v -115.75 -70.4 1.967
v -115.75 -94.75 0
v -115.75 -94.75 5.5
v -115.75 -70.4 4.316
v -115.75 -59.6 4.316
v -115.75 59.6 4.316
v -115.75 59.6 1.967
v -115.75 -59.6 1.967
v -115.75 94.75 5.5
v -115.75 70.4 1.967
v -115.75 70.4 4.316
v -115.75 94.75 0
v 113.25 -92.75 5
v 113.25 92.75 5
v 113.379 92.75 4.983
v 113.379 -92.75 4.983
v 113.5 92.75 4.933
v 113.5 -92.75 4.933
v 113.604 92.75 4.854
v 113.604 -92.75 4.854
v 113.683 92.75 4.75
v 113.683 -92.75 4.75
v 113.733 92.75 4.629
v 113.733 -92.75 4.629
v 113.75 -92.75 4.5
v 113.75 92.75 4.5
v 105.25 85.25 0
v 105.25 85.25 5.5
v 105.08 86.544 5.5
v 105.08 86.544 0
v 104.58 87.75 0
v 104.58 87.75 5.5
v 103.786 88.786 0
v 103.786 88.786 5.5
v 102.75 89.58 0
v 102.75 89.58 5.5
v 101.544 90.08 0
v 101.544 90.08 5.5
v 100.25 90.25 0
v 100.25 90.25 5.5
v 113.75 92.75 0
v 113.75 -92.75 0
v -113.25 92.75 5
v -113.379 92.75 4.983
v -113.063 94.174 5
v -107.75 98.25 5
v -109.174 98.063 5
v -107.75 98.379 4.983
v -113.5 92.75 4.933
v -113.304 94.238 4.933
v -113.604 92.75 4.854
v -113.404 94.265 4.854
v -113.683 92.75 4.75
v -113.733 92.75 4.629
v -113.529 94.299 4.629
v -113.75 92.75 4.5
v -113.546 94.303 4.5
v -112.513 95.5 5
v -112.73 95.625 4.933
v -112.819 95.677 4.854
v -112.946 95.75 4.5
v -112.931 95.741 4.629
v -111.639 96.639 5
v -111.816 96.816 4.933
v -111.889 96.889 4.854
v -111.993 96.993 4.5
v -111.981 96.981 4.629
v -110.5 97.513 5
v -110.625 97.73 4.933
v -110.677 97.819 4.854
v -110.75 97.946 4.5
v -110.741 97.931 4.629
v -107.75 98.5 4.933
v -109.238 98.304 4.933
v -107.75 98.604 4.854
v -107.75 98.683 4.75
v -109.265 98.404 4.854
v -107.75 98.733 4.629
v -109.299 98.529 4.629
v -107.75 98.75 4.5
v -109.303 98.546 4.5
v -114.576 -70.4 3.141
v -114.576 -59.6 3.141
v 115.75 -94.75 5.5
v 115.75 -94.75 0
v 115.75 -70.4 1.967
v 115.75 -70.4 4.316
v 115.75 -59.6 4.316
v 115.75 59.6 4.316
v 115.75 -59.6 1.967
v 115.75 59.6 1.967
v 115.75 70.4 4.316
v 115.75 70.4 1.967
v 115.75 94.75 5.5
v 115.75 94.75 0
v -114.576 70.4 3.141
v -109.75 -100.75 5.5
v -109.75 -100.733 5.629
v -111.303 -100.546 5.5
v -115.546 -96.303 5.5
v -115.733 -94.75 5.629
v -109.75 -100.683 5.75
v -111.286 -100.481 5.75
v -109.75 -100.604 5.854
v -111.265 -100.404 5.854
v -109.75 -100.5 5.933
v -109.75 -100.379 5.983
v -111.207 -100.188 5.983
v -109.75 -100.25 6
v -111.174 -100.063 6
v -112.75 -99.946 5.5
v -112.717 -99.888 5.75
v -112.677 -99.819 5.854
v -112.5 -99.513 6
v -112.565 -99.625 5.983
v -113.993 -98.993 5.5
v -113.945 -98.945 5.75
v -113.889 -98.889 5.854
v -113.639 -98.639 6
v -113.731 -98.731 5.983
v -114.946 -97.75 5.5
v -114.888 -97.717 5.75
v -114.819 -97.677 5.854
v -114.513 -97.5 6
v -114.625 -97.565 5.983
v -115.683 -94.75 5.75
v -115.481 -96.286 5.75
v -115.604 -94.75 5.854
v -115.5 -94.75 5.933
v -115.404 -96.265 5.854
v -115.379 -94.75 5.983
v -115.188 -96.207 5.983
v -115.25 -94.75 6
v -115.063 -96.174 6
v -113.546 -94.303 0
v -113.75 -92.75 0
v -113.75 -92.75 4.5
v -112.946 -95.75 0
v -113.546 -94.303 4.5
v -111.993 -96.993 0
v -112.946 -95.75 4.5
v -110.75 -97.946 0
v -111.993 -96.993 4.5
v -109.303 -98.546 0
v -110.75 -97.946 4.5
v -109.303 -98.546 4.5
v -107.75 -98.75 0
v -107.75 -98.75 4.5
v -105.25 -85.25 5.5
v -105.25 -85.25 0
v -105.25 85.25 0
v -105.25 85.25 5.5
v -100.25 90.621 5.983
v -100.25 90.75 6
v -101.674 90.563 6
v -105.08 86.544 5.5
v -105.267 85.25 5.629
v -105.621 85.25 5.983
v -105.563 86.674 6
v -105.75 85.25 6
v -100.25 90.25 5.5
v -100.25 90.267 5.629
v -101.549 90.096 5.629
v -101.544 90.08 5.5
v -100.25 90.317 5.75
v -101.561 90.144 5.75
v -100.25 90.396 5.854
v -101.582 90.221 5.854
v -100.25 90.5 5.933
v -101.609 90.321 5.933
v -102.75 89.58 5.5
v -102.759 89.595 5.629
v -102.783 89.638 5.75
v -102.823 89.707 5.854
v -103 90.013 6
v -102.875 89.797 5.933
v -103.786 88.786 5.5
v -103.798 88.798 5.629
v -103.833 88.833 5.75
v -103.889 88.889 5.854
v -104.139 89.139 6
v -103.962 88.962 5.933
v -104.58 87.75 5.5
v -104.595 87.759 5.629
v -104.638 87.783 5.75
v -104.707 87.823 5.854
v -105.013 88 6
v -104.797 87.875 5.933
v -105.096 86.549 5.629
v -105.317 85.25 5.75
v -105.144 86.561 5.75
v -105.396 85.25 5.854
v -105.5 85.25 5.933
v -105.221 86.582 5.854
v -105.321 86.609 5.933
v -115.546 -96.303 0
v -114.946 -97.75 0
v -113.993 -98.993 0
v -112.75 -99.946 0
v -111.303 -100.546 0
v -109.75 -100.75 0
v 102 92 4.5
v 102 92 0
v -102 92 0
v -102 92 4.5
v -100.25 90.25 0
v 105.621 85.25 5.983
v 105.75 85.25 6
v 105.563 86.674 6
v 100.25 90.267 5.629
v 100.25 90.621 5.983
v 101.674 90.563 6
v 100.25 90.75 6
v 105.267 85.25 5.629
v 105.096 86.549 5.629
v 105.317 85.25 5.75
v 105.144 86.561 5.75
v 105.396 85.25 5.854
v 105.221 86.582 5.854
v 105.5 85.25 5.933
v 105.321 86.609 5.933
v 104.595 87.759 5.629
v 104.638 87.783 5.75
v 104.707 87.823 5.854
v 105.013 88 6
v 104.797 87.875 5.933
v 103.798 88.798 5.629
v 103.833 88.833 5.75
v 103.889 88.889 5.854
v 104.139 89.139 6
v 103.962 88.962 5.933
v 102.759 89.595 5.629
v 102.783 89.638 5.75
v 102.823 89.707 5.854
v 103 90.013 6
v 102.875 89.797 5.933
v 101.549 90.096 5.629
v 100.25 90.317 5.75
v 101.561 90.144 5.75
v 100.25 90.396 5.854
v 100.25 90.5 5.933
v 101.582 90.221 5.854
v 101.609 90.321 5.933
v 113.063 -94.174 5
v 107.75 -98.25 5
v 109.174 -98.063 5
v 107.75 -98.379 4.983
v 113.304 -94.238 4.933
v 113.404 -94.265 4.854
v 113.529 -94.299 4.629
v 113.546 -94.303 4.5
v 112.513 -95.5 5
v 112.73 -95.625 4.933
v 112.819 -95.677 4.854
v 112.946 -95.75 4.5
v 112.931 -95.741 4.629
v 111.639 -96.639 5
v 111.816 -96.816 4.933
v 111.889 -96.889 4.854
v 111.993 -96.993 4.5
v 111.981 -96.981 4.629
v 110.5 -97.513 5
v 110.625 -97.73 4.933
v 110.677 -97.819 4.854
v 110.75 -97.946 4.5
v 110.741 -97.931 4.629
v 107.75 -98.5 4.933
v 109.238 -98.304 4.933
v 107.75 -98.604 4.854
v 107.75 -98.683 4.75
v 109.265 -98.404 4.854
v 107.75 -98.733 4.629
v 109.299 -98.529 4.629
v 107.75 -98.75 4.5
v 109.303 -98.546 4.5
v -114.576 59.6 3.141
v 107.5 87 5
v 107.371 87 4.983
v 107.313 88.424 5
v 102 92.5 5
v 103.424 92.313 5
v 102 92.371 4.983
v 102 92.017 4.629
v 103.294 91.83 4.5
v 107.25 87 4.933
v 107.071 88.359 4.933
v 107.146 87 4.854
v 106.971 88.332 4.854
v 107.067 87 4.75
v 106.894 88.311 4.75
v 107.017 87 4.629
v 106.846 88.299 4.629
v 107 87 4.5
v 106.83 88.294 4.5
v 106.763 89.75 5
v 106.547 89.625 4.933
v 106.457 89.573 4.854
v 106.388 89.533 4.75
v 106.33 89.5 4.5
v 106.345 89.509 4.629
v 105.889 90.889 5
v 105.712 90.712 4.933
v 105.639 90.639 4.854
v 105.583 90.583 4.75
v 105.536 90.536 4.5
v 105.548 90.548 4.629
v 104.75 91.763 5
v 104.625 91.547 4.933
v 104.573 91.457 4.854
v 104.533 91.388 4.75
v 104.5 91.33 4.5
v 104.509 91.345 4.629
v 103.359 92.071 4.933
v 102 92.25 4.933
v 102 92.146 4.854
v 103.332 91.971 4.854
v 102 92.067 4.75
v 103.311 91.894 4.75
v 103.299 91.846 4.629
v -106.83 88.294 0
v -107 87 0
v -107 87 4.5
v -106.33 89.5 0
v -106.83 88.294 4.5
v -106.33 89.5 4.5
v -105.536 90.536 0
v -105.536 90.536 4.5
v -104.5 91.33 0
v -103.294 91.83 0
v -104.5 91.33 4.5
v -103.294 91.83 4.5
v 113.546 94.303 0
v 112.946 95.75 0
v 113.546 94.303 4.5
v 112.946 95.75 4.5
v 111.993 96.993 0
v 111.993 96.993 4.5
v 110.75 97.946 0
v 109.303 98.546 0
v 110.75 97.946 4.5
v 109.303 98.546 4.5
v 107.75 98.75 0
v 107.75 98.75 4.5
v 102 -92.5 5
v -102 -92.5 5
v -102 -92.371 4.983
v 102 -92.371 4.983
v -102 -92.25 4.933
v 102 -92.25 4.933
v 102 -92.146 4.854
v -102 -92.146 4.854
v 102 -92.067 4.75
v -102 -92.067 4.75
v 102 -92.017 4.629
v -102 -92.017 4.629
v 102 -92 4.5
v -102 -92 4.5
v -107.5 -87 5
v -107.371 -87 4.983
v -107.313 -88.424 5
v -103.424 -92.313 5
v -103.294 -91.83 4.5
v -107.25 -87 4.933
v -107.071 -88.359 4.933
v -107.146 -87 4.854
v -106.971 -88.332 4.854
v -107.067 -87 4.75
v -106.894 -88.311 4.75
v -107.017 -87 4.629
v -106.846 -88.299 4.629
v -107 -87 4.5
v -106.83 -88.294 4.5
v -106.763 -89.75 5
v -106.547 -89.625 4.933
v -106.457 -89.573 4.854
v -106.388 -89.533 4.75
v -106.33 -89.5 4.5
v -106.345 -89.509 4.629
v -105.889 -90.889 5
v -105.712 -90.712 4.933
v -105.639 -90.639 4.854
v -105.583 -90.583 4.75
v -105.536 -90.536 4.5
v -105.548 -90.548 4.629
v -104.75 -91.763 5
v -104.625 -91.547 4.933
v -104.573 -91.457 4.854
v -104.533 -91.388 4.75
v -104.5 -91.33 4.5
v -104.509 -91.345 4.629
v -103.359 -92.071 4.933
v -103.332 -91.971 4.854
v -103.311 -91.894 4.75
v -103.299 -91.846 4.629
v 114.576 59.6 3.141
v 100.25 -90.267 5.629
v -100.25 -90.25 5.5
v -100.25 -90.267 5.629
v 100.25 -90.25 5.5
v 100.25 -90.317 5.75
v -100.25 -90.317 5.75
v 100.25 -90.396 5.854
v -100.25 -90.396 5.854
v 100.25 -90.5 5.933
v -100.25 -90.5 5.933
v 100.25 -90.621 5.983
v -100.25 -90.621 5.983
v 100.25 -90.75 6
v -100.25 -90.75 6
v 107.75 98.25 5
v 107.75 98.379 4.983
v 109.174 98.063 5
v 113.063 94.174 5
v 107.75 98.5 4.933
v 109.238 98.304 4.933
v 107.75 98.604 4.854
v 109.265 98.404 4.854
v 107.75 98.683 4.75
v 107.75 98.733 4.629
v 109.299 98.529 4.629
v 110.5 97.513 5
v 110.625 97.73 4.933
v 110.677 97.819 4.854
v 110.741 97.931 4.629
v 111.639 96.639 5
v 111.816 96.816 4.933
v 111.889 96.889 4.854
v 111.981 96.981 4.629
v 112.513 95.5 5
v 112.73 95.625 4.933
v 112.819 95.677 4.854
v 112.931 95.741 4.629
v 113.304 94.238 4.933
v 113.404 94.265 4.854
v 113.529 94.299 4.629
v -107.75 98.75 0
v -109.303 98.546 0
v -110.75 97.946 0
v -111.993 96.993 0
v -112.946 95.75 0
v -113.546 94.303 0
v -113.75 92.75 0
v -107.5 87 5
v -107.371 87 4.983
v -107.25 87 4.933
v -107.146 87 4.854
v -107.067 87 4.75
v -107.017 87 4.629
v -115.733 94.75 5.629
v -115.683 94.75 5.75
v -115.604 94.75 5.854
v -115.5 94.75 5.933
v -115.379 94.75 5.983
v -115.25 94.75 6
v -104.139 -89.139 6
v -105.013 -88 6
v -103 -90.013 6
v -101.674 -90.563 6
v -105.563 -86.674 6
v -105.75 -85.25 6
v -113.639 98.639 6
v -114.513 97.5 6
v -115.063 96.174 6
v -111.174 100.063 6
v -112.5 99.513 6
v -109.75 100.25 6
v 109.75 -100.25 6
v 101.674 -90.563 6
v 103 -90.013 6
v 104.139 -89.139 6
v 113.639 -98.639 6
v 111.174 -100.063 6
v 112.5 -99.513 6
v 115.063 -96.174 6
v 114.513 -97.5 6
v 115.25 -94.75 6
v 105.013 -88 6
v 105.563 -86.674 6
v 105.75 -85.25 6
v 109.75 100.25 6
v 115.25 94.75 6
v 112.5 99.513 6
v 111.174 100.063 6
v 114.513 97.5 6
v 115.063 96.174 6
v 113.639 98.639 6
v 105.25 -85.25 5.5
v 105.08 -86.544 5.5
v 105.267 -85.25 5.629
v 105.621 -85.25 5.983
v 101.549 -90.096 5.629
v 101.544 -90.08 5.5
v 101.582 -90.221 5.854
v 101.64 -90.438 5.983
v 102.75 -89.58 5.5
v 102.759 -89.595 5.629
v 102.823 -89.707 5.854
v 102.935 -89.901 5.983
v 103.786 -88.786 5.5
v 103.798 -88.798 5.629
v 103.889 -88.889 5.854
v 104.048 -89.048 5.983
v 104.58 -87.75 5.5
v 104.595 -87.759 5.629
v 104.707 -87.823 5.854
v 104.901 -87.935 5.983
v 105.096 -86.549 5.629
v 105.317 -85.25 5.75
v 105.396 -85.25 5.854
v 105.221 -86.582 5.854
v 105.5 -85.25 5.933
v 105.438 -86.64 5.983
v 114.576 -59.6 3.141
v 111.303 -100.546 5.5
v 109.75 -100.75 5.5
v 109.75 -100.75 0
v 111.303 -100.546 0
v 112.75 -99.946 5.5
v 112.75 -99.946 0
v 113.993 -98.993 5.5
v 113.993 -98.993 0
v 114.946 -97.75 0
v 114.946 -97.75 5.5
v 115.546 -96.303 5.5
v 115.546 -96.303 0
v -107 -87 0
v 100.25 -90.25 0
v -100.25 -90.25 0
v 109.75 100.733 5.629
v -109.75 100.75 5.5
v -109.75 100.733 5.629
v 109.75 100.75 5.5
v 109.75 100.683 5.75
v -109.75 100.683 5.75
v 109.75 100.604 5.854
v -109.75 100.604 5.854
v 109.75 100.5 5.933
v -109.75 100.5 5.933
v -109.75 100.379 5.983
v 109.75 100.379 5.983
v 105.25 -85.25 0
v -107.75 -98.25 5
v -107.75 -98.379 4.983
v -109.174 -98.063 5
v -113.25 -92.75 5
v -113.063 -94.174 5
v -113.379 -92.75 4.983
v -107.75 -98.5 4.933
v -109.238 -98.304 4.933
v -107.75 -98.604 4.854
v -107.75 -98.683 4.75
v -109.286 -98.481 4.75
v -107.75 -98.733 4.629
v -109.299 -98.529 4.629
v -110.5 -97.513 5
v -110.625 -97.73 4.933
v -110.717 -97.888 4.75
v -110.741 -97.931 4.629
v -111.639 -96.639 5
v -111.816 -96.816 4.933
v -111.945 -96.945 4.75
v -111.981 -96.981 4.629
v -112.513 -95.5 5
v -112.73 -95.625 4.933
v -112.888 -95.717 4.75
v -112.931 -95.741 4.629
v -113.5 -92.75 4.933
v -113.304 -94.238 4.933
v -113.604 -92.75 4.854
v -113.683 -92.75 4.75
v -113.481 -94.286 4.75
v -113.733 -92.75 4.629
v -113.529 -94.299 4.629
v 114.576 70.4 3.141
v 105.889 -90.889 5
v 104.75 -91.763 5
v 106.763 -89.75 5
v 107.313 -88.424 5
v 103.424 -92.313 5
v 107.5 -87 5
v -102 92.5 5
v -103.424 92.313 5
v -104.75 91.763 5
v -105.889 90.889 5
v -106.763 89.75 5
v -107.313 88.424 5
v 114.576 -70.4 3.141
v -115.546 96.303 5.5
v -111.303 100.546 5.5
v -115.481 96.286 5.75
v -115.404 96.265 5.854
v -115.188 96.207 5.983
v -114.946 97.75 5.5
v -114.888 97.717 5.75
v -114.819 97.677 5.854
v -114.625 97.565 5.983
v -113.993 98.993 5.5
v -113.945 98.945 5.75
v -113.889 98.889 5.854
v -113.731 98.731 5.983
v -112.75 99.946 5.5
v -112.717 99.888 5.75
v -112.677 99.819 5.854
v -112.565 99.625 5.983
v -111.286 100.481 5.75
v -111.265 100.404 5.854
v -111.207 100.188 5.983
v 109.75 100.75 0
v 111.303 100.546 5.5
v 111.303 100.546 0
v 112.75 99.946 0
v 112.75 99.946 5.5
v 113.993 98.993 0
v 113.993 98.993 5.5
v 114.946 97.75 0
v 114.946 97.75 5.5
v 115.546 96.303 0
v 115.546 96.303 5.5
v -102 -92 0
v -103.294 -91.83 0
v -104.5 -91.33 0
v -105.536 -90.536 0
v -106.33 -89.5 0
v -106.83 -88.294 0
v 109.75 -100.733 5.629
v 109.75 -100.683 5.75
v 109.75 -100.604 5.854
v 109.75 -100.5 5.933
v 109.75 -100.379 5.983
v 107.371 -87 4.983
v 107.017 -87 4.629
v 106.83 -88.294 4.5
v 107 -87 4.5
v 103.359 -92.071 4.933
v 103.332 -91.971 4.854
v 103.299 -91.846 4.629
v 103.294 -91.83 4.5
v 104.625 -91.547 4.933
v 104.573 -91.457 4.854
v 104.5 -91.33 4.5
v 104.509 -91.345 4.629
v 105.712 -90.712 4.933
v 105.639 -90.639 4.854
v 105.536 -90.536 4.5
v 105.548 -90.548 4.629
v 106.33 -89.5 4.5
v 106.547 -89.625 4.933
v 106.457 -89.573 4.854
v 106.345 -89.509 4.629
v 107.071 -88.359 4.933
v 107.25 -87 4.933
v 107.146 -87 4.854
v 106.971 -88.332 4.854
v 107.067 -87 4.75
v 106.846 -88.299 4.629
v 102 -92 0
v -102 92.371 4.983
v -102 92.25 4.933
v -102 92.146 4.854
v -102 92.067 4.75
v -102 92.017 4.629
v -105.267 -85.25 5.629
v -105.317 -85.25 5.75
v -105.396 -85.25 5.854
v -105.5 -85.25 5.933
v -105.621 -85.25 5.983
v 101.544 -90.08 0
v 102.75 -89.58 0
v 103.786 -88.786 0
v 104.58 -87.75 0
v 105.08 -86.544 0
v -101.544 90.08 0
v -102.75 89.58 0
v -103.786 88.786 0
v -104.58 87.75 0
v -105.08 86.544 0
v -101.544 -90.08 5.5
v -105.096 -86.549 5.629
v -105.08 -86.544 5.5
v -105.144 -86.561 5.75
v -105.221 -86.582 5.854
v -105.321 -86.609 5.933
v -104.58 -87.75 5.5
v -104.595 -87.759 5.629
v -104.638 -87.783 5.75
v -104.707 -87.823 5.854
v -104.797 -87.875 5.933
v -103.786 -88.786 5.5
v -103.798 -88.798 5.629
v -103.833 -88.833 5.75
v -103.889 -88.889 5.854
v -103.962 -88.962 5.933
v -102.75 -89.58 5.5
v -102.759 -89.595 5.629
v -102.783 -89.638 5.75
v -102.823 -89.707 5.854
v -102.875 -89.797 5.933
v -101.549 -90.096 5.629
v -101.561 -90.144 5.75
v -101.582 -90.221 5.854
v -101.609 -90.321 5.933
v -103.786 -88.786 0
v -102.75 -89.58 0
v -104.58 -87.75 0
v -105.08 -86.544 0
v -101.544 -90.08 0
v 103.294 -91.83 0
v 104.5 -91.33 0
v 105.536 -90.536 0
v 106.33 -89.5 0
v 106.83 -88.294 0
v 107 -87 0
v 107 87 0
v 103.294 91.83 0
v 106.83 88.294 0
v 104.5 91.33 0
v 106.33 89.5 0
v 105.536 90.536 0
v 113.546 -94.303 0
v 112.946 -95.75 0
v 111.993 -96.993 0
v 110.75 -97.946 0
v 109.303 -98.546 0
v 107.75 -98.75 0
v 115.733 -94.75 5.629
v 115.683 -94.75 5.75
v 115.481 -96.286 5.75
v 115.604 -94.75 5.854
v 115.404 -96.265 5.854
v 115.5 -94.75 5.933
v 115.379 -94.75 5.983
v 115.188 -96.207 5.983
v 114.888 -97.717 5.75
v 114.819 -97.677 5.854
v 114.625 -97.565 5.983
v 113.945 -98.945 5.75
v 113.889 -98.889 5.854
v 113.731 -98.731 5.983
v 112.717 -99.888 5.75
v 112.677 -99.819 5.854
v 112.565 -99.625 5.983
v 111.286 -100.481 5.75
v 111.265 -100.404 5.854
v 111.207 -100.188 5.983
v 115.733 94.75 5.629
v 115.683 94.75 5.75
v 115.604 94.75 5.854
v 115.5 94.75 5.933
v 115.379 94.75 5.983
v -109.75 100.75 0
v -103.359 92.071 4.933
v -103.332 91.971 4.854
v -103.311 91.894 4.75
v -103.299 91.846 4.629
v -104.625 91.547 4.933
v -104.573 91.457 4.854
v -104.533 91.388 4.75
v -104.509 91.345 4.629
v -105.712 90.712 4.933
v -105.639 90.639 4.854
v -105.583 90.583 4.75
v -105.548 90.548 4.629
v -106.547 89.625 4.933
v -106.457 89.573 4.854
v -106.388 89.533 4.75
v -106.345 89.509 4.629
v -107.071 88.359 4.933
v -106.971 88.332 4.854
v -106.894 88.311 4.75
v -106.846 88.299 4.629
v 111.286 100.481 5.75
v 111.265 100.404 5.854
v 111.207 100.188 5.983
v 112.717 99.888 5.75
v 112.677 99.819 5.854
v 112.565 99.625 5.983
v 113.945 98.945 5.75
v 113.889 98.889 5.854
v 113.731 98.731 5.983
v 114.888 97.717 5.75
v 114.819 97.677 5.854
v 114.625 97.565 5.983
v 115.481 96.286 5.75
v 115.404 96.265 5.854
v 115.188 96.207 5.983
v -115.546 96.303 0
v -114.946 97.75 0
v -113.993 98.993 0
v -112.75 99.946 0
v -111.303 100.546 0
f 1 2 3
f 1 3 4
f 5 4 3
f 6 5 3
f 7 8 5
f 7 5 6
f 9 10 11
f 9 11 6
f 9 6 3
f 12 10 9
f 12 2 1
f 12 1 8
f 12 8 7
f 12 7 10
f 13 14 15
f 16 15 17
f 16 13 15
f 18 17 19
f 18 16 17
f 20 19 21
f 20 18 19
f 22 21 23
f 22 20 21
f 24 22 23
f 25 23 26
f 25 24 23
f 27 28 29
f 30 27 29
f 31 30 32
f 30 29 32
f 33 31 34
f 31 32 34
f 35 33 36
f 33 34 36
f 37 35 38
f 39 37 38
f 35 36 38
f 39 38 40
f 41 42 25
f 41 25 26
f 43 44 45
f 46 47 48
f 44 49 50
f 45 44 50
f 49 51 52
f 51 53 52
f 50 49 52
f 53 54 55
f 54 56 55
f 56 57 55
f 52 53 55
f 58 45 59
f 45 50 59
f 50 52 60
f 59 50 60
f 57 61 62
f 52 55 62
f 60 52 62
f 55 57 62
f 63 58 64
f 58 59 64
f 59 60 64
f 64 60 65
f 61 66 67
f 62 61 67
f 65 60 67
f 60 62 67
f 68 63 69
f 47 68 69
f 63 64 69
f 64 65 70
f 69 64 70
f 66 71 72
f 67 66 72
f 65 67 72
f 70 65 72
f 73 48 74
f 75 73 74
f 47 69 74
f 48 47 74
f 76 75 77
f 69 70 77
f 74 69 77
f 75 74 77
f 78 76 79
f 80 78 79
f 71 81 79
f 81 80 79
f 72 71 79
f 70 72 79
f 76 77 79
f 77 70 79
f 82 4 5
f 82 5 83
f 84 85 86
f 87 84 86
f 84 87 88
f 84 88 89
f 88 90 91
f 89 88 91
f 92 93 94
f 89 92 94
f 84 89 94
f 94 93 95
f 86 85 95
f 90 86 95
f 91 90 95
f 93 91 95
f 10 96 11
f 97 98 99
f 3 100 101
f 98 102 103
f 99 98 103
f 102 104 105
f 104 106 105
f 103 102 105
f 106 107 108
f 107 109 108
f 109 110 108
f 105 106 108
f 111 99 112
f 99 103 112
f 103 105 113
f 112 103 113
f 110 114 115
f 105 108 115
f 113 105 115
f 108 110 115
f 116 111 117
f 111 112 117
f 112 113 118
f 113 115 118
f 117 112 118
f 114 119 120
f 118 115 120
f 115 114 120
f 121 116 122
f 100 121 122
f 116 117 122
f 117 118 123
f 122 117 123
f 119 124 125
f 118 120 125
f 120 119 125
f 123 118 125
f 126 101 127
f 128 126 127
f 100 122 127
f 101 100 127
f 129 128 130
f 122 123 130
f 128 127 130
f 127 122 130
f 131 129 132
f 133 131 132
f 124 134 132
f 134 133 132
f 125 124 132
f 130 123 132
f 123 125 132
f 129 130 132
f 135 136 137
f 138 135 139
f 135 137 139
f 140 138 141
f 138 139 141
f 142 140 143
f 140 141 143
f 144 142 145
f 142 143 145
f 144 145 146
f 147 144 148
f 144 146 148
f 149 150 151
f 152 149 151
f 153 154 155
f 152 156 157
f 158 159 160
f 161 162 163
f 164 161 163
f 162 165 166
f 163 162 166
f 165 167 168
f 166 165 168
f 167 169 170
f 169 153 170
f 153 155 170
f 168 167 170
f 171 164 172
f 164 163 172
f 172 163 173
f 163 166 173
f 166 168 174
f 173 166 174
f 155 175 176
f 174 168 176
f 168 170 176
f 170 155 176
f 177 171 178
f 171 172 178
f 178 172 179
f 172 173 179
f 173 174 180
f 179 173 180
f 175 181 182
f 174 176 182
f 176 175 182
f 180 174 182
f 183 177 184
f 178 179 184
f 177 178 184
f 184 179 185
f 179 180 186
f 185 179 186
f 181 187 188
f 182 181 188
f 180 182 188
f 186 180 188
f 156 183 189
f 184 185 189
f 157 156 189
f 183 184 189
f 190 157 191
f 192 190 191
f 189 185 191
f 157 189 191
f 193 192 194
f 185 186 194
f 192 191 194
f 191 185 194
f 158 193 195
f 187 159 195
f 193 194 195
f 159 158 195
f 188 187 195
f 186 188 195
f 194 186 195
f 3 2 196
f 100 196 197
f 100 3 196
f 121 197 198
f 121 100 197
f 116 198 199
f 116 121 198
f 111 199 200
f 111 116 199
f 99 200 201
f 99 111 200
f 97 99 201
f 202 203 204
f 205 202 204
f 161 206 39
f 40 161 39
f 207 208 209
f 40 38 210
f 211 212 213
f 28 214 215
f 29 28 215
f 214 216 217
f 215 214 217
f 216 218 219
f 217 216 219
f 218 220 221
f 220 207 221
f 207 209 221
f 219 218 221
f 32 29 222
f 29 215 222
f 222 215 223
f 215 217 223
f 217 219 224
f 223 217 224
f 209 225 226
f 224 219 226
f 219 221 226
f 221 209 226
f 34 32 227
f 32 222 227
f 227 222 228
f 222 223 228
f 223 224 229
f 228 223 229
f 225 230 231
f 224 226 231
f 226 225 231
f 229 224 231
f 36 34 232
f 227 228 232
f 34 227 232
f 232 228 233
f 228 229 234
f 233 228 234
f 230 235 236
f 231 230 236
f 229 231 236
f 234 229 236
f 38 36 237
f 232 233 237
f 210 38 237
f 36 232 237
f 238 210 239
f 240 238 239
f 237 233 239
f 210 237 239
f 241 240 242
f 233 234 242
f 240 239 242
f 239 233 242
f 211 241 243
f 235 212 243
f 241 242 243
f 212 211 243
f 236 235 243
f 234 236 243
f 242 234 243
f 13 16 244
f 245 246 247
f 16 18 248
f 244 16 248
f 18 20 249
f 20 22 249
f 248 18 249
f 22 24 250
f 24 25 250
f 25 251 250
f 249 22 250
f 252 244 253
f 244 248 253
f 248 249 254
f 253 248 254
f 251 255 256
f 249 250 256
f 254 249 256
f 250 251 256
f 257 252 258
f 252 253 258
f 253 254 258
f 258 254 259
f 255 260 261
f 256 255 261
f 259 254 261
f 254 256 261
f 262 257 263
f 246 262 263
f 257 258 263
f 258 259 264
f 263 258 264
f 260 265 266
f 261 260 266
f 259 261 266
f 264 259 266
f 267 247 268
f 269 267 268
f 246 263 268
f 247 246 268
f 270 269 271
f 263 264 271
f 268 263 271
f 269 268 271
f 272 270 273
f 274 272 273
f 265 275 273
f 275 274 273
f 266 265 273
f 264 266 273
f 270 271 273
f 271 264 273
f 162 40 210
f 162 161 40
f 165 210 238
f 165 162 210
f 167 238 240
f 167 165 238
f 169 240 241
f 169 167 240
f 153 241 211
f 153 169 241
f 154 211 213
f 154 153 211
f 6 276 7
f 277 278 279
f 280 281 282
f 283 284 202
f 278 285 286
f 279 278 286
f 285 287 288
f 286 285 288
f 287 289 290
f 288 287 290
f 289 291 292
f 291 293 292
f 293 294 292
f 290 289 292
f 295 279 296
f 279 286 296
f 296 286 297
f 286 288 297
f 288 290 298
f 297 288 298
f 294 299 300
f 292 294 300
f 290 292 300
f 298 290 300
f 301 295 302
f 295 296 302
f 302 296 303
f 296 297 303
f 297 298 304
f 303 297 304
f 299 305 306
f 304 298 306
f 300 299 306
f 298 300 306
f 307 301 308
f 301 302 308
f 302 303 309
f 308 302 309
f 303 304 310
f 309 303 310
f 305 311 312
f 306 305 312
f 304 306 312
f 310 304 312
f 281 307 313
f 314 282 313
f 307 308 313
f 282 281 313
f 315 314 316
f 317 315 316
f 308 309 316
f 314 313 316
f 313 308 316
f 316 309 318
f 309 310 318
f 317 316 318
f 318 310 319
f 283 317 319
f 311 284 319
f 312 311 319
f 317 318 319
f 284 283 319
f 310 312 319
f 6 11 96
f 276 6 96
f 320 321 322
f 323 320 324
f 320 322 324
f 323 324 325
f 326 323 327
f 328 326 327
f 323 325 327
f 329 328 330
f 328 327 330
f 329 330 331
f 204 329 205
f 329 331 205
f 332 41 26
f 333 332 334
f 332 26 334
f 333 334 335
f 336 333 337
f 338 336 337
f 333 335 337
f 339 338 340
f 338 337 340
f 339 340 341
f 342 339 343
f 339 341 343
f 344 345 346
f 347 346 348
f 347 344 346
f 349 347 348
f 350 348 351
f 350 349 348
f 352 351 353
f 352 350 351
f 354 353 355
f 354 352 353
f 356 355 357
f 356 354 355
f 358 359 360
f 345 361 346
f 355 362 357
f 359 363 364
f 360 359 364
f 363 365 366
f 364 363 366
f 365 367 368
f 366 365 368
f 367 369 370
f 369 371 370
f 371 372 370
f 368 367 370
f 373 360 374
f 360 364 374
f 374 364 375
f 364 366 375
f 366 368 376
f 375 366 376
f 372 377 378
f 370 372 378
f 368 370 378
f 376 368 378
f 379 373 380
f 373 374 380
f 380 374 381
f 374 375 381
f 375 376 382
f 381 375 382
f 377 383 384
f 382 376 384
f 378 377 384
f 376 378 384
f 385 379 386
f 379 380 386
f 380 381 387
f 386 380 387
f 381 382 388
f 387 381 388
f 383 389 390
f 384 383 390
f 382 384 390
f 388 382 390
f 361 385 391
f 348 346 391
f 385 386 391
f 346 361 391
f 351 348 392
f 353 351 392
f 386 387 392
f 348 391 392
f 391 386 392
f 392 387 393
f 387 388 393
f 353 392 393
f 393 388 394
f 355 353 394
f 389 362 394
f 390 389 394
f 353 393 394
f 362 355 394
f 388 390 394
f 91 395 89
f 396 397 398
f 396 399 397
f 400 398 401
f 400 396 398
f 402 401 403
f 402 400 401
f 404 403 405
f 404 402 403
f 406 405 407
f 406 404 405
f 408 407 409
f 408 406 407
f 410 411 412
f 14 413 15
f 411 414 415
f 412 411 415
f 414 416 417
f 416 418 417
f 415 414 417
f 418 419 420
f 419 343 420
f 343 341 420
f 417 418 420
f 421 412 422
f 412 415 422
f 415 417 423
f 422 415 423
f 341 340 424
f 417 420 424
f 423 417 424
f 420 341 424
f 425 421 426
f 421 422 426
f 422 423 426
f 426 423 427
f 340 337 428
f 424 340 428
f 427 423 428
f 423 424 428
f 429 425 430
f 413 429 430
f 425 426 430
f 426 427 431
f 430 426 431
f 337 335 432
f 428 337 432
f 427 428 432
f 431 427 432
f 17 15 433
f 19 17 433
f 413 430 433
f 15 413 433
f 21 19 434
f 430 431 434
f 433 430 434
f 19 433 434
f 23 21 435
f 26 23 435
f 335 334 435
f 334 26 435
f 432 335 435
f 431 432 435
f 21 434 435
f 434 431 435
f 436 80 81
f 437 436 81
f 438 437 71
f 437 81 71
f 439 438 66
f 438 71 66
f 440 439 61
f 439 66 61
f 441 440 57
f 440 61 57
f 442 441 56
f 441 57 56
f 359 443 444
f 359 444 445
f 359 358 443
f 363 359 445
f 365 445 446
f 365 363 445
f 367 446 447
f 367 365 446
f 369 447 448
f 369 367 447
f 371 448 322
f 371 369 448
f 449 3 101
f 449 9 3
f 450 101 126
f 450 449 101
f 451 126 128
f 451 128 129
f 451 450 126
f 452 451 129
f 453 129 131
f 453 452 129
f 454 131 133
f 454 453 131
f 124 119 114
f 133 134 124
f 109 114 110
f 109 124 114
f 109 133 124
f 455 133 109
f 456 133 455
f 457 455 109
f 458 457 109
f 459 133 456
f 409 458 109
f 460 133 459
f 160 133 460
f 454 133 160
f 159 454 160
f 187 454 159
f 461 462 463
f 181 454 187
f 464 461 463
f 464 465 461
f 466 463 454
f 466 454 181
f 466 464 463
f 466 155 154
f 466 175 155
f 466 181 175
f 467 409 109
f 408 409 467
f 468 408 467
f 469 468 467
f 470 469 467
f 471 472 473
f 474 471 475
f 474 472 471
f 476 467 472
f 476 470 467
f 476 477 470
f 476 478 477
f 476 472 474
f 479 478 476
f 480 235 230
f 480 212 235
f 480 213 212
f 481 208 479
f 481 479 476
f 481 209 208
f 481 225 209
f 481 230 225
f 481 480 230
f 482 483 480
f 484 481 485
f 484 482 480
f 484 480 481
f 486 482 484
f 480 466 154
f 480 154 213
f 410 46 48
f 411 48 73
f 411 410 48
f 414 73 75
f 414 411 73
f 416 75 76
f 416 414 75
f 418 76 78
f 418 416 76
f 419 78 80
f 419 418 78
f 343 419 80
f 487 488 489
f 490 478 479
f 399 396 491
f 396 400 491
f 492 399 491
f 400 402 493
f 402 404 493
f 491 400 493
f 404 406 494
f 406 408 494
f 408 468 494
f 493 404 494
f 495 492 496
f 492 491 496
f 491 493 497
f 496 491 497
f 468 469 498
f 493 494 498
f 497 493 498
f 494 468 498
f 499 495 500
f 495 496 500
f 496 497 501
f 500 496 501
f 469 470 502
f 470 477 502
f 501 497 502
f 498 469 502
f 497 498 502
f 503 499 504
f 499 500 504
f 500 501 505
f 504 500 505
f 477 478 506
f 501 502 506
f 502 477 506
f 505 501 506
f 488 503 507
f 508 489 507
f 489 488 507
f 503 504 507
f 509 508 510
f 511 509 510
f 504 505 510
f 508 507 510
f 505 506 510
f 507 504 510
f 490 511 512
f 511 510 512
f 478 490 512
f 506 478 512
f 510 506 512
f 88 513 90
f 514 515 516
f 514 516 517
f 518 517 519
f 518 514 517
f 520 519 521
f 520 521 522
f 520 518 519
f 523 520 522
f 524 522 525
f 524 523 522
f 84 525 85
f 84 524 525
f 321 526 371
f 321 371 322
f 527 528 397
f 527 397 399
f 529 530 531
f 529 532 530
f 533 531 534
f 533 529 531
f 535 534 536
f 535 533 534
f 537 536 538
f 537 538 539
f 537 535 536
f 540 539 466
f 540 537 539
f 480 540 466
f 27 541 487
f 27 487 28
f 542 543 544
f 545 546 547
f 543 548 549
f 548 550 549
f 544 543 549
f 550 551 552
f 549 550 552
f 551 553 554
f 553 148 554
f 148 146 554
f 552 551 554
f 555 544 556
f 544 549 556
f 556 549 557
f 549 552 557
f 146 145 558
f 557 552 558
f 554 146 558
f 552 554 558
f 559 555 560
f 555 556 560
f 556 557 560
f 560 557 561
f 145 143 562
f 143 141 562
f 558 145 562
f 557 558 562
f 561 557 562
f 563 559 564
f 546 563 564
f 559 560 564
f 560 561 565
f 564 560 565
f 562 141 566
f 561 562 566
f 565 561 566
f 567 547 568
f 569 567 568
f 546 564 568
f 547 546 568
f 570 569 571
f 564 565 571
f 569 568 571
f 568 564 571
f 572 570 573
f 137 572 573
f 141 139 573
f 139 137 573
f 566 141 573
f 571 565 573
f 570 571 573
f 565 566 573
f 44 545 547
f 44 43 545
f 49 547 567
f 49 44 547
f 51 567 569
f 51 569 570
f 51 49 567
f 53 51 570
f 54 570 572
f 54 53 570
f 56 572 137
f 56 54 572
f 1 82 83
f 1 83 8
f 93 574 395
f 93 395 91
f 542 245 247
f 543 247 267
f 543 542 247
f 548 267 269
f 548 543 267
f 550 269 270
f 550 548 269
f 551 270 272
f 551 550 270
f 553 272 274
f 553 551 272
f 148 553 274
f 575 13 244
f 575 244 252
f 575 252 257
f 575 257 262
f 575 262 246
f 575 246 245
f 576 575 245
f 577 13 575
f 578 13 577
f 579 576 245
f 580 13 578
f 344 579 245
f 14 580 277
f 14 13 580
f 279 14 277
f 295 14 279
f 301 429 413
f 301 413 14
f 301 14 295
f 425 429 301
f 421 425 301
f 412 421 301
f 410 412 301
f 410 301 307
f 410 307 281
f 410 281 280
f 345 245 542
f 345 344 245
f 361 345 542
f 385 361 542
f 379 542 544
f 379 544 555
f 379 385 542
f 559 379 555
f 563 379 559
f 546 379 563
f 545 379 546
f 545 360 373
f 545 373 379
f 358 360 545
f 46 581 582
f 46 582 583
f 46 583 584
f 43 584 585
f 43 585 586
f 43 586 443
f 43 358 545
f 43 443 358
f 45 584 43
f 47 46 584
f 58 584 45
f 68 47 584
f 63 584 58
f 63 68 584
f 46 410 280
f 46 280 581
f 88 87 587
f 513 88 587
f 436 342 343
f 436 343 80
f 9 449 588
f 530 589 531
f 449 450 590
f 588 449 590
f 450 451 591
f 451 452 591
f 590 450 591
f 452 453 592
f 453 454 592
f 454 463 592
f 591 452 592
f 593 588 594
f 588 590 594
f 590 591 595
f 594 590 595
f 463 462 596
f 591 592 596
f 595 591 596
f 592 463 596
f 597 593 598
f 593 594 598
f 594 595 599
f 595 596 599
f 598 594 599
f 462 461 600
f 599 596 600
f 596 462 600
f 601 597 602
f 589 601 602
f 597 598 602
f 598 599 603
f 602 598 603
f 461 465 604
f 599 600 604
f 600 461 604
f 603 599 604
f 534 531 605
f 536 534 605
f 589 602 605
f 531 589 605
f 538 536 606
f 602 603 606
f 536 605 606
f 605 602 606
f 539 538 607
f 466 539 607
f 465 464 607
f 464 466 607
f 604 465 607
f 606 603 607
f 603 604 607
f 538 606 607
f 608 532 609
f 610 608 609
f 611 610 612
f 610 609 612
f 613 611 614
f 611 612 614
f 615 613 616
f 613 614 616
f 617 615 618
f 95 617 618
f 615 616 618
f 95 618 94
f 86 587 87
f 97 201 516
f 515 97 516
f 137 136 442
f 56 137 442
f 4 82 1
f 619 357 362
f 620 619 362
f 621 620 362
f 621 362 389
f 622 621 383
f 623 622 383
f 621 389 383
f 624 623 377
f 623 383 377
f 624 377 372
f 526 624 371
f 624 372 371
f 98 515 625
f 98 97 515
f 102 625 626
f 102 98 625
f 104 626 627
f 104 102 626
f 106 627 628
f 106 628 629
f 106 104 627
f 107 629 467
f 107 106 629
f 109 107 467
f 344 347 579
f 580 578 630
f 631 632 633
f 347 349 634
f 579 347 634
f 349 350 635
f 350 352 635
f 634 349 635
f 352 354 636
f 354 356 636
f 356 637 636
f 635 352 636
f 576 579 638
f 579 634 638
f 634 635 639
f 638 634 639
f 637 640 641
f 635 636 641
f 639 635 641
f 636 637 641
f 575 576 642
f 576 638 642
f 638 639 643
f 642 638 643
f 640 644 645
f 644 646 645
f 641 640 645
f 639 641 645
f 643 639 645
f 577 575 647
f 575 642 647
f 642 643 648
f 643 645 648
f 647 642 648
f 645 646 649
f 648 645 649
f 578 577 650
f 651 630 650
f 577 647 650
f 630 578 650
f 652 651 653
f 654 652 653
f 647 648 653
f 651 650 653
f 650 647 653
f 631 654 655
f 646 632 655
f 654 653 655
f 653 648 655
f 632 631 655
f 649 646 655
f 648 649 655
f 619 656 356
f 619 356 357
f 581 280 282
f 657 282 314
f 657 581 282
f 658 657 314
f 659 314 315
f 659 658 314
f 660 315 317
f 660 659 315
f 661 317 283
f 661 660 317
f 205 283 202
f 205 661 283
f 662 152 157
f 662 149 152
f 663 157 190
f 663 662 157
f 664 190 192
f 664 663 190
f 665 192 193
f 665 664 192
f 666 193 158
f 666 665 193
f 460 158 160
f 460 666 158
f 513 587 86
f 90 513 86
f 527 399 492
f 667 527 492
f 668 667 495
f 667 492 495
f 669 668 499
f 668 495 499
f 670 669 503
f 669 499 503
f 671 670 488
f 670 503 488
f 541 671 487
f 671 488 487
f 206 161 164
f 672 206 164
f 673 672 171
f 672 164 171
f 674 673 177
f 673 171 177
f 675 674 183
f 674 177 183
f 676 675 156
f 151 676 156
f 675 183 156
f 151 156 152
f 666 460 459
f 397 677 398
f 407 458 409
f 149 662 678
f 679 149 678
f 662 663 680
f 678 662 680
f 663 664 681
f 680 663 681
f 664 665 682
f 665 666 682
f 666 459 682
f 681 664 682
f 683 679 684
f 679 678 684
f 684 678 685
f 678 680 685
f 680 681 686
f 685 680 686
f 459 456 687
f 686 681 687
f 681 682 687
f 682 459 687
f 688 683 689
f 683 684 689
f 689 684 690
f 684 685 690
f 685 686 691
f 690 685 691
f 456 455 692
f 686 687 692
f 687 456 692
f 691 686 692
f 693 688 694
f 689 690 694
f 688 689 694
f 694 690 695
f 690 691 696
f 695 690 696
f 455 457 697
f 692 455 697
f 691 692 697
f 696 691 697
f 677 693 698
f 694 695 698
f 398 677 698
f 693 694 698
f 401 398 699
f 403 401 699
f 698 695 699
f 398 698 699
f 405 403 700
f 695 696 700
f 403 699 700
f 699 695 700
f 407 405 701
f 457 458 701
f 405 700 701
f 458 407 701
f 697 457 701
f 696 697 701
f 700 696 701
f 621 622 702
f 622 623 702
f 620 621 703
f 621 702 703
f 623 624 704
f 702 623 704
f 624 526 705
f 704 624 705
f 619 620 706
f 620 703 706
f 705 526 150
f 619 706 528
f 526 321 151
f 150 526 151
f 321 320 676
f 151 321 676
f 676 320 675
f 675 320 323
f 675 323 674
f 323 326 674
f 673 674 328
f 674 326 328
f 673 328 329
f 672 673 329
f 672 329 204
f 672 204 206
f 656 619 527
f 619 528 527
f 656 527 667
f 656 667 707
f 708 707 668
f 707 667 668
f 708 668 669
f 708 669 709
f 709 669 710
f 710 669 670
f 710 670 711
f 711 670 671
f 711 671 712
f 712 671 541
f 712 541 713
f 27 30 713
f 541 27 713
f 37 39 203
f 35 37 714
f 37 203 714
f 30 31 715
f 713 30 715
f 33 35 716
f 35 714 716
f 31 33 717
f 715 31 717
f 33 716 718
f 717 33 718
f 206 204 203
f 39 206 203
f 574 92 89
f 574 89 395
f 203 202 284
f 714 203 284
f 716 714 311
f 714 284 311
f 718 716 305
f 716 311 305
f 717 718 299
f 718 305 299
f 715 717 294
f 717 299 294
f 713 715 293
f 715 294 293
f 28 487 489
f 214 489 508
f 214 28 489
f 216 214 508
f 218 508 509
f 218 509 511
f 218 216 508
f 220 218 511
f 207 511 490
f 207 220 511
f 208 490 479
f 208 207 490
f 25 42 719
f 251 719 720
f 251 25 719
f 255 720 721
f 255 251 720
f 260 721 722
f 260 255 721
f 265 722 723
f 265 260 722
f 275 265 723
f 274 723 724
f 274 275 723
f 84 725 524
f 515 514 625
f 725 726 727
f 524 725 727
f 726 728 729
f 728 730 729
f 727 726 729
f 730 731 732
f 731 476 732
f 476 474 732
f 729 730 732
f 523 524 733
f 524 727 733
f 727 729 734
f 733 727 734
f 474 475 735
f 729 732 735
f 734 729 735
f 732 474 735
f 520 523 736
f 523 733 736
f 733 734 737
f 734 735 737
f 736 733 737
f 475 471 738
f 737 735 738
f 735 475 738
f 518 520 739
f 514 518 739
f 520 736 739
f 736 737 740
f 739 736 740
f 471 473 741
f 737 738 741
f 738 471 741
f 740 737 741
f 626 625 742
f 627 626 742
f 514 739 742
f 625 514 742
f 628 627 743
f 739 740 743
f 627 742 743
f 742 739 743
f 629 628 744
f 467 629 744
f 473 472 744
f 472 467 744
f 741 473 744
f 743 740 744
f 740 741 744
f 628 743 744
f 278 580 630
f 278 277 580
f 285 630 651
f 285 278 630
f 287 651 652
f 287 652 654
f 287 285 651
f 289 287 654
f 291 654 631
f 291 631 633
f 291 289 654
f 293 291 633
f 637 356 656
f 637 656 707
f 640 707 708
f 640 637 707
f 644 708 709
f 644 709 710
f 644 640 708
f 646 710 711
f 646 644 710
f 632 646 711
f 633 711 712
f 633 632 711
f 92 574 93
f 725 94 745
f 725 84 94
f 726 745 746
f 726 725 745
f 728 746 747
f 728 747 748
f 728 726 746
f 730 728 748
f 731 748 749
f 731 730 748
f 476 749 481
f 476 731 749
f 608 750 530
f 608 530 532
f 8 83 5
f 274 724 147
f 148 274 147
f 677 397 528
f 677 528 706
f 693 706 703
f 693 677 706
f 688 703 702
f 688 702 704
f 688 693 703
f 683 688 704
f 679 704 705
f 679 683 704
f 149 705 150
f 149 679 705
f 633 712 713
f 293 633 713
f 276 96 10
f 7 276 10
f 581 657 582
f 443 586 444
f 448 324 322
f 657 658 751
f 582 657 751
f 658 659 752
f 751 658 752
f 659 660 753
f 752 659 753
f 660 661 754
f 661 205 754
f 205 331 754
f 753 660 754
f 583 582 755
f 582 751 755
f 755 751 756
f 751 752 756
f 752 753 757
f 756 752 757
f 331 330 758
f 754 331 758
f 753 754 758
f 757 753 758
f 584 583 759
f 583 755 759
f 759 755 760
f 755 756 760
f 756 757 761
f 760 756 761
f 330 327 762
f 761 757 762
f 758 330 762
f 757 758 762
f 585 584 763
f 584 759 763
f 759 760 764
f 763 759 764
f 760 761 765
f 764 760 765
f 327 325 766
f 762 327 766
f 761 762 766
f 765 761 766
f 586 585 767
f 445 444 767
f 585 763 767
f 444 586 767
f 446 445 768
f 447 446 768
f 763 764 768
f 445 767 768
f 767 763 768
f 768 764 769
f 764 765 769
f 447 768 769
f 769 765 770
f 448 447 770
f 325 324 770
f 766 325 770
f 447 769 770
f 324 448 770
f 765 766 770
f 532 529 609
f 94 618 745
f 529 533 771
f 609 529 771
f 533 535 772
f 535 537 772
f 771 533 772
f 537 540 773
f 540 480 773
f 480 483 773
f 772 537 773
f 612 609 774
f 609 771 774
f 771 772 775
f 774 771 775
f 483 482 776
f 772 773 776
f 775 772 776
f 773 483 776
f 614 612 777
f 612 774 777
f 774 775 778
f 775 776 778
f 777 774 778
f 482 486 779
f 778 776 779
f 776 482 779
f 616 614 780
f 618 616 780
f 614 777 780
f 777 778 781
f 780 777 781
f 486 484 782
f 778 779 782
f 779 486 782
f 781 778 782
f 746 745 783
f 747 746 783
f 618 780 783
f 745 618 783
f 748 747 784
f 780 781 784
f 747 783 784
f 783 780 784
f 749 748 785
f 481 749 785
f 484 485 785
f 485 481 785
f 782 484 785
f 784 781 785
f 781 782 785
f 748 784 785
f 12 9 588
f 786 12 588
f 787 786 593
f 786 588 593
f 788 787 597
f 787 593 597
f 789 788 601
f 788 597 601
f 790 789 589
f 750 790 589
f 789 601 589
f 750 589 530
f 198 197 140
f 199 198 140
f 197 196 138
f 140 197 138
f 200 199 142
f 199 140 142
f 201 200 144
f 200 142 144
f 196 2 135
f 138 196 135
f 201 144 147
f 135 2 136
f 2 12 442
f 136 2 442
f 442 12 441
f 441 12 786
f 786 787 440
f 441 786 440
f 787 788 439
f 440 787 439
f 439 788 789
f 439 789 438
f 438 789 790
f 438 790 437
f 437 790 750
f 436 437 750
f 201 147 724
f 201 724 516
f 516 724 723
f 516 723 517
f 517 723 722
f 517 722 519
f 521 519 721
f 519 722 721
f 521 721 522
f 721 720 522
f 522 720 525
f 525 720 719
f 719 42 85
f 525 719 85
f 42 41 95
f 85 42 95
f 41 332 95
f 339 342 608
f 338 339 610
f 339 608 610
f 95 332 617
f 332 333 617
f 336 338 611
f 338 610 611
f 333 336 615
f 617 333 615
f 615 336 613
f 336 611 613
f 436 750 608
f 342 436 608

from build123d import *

# Parameters (mm, degrees)
SKETCH1_W                                = 231.5
SKETCH1_H                                = 201.5
SKETCH1_W_2                              = 210.5
SKETCH1_H_2                              = 180.5
MAIN_BODY_DEPTH                          = 6
FILLET1_R                                = 5
FILLET2_R                                = 6
SKETCH3_W                                = 227.5
SKETCH3_H                                = 197.5
SKETCH3_W_2                              = 214
SKETCH3_H_2                              = 184
MAIN_CAVITY_DEPTH                        = 5
FILLET6_R                                = 6
FILLET4_R                                = 5
CAVITY1_START                            = 83.43860018
CAVITY1_OUTLINE_W                        = 1.804040507
CAVITY1_OUTLINE_H                        = 10
CAVITY1_DEPTH                            = 1.060660172
CAVITY1_START_2                          = -80.256619665
CAVITY1_2_OUTLINE_W                      = 1.56139982
CAVITY1_2_OUTLINE_H                      = 10
CAVITY1_2_DEPTH                          = 1.060660172
SNAP_START                               = -0.4
SNAP_FIT_DEPTH                           = 10.8
MIRROR1_START                            = -0.4
MIRROR1_AT_THE_SECOND_PLANE_COPY_1_DEPTH = 10.8
FILLET7_R                                = 0.5


# Read off the part's stored shape, not the designer's step: Cavity1
with BuildPart() as part:
    # Sketch1 → Main Body (new body)
    with BuildSketch(Plane.XY):
        Rectangle(SKETCH1_W, SKETCH1_H)
        Rectangle(SKETCH1_W_2, SKETCH1_H_2, mode=Mode.SUBTRACT)
    extrude(amount=MAIN_BODY_DEPTH)

    # Fillet1
    fillet1_edges = [part.edges().sort_by_distance(p)[0] for p in [
        (105.25, -90.25, 3),
        (105.25, 90.25, 3),
        (-105.25, 90.25, 3),
        (-105.25, -90.25, 3),
    ]]
    fillet(fillet1_edges, radius=FILLET1_R)

    # Fillet2
    fillet2_edges = [part.edges().sort_by_distance(p)[0] for p in [
        (115.75, -100.75, 3),
        (-115.75, -100.75, 3),
        (-115.75, 100.75, 3),
        (115.75, 100.75, 3),
    ]]
    fillet(fillet2_edges, radius=FILLET2_R)

    # Sketch3 → Main Cavity (cut)
    with BuildSketch(Plane(origin=(0, 0, 0), x_dir=(-1, 0, 0), z_dir=(0, 0, -1))):
        Rectangle(SKETCH3_W, SKETCH3_H)
        Rectangle(SKETCH3_W_2, SKETCH3_H_2, mode=Mode.SUBTRACT)
    extrude(amount=-MAIN_CAVITY_DEPTH, mode=Mode.SUBTRACT)

    # Fillet6
    fillet6_edges = [part.edges().sort_by_distance(p)[0] for p in [
        (-113.75, 98.75, 2.5),
        (-113.75, -98.75, 2.5),
        (113.75, -98.75, 2.5),
        (113.75, 98.75, 2.5),
    ]]
    fillet(fillet6_edges, radius=FILLET6_R)

    # Fillet4
    fillet4_edges = [part.edges().sort_by_distance(p)[0] for p in [
        (-107, -92, 2.5),
        (107, -92, 2.5),
        (107, 92, 2.5),
        (-107, 92, 2.5),
    ]]
    fillet(fillet4_edges, radius=FILLET4_R)

    # Cavity1 outline → Cavity1 (cut)
    with BuildSketch(Plane(origin=(0, 0, 0), x_dir=(0.7071067811865474, 0, -0.7071067811865477), z_dir=(0.7071067811865476, 0, 0.7071067811865476)).offset(CAVITY1_START)):
        with Locations((80.097979747, 65)):
            Rectangle(CAVITY1_OUTLINE_W, CAVITY1_OUTLINE_H)
        with Locations((80.097979747, -65)):
            Rectangle(CAVITY1_OUTLINE_W, CAVITY1_OUTLINE_H)
    extrude(amount=CAVITY1_DEPTH, mode=Mode.SUBTRACT)

    # Cavity1 2 outline → Cavity1 2 (cut)
    with BuildSketch(Plane(origin=(0, 0, 0), x_dir=(0.7071067811865474, 0, -0.7071067811865477), z_dir=(0.7071067811865476, 0, 0.7071067811865476)).offset(CAVITY1_START_2)):
        with Locations((-84.21930009, 65)):
            Rectangle(CAVITY1_2_OUTLINE_W, CAVITY1_2_OUTLINE_H)
        with Locations((-84.21930009, -65)):
            Rectangle(CAVITY1_2_OUTLINE_W, CAVITY1_2_OUTLINE_H)
    extrude(amount=CAVITY1_2_DEPTH, mode=Mode.SUBTRACT)

    # Sketch4 → Snap Fit (cut)
    with BuildSketch(Plane.XZ.offset(-70).offset(SNAP_START)):
        Polygon((-115.75, 4.315685425), (-114.575735931, 3.141421356), (-115.75, 1.967157288), align=None)
    snap_fit = extrude(amount=SNAP_FIT_DEPTH, mode=Mode.SUBTRACT)

    # Mirror1: Snap Fit across plane
    add(snap_fit.mirror(Plane.ZX), mode=Mode.SUBTRACT)

    # Mirror1 at the second plane: Snap Fit across plane
    add(snap_fit.mirror(Plane(origin=(0, 0, 0), x_dir=(0, 0, 1), z_dir=(1, 0, 0))), mode=Mode.SUBTRACT)

    # Mirror1 at the second plane copy 1 sketc → Mirror1 at the second plane copy 1 (cut)
    with BuildSketch(Plane(origin=(0, -70, 0), x_dir=(-1, 0, 0), z_dir=(0, 1, 0)).offset(MIRROR1_START)):
        Polygon((-115.75, 4.315685425), (-114.575735931, 3.141421356), (-115.75, 1.967157288), align=None)
    extrude(amount=MIRROR1_AT_THE_SECOND_PLANE_COPY_1_DEPTH, mode=Mode.SUBTRACT)

    # Fillet7
    fillet7_edges = [part.edges().sort_by_distance(p)[0] for p in [
        (-113.75, 0, 5),
        (0, -98.75, 5),
        (0, 98.75, 5),
        (113.75, 0, 5),
        (-111.992640687, 96.992640687, 5),
        (111.992640687, 96.992640687, 5),
        (111.992640687, -96.992640687, 5),
        (-111.992640687, -96.992640687, 5),
        (107, 0, 5),
        (0, -92, 5),
        (0, 92, 5),
        (-107, 0, 5),
        (105.535533906, -90.535533906, 5),
        (105.535533906, 90.535533906, 5),
        (-105.535533906, 90.535533906, 5),
        (-105.535533906, -90.535533906, 5),
        (105.25, 0, 6),
        (0, 90.25, 6),
        (0, -90.25, 6),
        (-105.25, 0, 6),
        (103.785533906, 88.785533906, 6),
        (103.785533906, -88.785533906, 6),
        (-103.785533906, -88.785533906, 6),
        (-103.785533906, 88.785533906, 6),
        (0, 100.75, 6),
        (115.75, 0, 6),
        (-115.75, 0, 6),
        (0, -100.75, 6),
        (-113.992640687, 98.992640687, 6),
        (-113.992640687, -98.992640687, 6),
        (113.992640687, -98.992640687, 6),
        (113.992640687, 98.992640687, 6),
    ]]
    fillet(fillet7_edges, radius=FILLET7_R)


solid = part.part
